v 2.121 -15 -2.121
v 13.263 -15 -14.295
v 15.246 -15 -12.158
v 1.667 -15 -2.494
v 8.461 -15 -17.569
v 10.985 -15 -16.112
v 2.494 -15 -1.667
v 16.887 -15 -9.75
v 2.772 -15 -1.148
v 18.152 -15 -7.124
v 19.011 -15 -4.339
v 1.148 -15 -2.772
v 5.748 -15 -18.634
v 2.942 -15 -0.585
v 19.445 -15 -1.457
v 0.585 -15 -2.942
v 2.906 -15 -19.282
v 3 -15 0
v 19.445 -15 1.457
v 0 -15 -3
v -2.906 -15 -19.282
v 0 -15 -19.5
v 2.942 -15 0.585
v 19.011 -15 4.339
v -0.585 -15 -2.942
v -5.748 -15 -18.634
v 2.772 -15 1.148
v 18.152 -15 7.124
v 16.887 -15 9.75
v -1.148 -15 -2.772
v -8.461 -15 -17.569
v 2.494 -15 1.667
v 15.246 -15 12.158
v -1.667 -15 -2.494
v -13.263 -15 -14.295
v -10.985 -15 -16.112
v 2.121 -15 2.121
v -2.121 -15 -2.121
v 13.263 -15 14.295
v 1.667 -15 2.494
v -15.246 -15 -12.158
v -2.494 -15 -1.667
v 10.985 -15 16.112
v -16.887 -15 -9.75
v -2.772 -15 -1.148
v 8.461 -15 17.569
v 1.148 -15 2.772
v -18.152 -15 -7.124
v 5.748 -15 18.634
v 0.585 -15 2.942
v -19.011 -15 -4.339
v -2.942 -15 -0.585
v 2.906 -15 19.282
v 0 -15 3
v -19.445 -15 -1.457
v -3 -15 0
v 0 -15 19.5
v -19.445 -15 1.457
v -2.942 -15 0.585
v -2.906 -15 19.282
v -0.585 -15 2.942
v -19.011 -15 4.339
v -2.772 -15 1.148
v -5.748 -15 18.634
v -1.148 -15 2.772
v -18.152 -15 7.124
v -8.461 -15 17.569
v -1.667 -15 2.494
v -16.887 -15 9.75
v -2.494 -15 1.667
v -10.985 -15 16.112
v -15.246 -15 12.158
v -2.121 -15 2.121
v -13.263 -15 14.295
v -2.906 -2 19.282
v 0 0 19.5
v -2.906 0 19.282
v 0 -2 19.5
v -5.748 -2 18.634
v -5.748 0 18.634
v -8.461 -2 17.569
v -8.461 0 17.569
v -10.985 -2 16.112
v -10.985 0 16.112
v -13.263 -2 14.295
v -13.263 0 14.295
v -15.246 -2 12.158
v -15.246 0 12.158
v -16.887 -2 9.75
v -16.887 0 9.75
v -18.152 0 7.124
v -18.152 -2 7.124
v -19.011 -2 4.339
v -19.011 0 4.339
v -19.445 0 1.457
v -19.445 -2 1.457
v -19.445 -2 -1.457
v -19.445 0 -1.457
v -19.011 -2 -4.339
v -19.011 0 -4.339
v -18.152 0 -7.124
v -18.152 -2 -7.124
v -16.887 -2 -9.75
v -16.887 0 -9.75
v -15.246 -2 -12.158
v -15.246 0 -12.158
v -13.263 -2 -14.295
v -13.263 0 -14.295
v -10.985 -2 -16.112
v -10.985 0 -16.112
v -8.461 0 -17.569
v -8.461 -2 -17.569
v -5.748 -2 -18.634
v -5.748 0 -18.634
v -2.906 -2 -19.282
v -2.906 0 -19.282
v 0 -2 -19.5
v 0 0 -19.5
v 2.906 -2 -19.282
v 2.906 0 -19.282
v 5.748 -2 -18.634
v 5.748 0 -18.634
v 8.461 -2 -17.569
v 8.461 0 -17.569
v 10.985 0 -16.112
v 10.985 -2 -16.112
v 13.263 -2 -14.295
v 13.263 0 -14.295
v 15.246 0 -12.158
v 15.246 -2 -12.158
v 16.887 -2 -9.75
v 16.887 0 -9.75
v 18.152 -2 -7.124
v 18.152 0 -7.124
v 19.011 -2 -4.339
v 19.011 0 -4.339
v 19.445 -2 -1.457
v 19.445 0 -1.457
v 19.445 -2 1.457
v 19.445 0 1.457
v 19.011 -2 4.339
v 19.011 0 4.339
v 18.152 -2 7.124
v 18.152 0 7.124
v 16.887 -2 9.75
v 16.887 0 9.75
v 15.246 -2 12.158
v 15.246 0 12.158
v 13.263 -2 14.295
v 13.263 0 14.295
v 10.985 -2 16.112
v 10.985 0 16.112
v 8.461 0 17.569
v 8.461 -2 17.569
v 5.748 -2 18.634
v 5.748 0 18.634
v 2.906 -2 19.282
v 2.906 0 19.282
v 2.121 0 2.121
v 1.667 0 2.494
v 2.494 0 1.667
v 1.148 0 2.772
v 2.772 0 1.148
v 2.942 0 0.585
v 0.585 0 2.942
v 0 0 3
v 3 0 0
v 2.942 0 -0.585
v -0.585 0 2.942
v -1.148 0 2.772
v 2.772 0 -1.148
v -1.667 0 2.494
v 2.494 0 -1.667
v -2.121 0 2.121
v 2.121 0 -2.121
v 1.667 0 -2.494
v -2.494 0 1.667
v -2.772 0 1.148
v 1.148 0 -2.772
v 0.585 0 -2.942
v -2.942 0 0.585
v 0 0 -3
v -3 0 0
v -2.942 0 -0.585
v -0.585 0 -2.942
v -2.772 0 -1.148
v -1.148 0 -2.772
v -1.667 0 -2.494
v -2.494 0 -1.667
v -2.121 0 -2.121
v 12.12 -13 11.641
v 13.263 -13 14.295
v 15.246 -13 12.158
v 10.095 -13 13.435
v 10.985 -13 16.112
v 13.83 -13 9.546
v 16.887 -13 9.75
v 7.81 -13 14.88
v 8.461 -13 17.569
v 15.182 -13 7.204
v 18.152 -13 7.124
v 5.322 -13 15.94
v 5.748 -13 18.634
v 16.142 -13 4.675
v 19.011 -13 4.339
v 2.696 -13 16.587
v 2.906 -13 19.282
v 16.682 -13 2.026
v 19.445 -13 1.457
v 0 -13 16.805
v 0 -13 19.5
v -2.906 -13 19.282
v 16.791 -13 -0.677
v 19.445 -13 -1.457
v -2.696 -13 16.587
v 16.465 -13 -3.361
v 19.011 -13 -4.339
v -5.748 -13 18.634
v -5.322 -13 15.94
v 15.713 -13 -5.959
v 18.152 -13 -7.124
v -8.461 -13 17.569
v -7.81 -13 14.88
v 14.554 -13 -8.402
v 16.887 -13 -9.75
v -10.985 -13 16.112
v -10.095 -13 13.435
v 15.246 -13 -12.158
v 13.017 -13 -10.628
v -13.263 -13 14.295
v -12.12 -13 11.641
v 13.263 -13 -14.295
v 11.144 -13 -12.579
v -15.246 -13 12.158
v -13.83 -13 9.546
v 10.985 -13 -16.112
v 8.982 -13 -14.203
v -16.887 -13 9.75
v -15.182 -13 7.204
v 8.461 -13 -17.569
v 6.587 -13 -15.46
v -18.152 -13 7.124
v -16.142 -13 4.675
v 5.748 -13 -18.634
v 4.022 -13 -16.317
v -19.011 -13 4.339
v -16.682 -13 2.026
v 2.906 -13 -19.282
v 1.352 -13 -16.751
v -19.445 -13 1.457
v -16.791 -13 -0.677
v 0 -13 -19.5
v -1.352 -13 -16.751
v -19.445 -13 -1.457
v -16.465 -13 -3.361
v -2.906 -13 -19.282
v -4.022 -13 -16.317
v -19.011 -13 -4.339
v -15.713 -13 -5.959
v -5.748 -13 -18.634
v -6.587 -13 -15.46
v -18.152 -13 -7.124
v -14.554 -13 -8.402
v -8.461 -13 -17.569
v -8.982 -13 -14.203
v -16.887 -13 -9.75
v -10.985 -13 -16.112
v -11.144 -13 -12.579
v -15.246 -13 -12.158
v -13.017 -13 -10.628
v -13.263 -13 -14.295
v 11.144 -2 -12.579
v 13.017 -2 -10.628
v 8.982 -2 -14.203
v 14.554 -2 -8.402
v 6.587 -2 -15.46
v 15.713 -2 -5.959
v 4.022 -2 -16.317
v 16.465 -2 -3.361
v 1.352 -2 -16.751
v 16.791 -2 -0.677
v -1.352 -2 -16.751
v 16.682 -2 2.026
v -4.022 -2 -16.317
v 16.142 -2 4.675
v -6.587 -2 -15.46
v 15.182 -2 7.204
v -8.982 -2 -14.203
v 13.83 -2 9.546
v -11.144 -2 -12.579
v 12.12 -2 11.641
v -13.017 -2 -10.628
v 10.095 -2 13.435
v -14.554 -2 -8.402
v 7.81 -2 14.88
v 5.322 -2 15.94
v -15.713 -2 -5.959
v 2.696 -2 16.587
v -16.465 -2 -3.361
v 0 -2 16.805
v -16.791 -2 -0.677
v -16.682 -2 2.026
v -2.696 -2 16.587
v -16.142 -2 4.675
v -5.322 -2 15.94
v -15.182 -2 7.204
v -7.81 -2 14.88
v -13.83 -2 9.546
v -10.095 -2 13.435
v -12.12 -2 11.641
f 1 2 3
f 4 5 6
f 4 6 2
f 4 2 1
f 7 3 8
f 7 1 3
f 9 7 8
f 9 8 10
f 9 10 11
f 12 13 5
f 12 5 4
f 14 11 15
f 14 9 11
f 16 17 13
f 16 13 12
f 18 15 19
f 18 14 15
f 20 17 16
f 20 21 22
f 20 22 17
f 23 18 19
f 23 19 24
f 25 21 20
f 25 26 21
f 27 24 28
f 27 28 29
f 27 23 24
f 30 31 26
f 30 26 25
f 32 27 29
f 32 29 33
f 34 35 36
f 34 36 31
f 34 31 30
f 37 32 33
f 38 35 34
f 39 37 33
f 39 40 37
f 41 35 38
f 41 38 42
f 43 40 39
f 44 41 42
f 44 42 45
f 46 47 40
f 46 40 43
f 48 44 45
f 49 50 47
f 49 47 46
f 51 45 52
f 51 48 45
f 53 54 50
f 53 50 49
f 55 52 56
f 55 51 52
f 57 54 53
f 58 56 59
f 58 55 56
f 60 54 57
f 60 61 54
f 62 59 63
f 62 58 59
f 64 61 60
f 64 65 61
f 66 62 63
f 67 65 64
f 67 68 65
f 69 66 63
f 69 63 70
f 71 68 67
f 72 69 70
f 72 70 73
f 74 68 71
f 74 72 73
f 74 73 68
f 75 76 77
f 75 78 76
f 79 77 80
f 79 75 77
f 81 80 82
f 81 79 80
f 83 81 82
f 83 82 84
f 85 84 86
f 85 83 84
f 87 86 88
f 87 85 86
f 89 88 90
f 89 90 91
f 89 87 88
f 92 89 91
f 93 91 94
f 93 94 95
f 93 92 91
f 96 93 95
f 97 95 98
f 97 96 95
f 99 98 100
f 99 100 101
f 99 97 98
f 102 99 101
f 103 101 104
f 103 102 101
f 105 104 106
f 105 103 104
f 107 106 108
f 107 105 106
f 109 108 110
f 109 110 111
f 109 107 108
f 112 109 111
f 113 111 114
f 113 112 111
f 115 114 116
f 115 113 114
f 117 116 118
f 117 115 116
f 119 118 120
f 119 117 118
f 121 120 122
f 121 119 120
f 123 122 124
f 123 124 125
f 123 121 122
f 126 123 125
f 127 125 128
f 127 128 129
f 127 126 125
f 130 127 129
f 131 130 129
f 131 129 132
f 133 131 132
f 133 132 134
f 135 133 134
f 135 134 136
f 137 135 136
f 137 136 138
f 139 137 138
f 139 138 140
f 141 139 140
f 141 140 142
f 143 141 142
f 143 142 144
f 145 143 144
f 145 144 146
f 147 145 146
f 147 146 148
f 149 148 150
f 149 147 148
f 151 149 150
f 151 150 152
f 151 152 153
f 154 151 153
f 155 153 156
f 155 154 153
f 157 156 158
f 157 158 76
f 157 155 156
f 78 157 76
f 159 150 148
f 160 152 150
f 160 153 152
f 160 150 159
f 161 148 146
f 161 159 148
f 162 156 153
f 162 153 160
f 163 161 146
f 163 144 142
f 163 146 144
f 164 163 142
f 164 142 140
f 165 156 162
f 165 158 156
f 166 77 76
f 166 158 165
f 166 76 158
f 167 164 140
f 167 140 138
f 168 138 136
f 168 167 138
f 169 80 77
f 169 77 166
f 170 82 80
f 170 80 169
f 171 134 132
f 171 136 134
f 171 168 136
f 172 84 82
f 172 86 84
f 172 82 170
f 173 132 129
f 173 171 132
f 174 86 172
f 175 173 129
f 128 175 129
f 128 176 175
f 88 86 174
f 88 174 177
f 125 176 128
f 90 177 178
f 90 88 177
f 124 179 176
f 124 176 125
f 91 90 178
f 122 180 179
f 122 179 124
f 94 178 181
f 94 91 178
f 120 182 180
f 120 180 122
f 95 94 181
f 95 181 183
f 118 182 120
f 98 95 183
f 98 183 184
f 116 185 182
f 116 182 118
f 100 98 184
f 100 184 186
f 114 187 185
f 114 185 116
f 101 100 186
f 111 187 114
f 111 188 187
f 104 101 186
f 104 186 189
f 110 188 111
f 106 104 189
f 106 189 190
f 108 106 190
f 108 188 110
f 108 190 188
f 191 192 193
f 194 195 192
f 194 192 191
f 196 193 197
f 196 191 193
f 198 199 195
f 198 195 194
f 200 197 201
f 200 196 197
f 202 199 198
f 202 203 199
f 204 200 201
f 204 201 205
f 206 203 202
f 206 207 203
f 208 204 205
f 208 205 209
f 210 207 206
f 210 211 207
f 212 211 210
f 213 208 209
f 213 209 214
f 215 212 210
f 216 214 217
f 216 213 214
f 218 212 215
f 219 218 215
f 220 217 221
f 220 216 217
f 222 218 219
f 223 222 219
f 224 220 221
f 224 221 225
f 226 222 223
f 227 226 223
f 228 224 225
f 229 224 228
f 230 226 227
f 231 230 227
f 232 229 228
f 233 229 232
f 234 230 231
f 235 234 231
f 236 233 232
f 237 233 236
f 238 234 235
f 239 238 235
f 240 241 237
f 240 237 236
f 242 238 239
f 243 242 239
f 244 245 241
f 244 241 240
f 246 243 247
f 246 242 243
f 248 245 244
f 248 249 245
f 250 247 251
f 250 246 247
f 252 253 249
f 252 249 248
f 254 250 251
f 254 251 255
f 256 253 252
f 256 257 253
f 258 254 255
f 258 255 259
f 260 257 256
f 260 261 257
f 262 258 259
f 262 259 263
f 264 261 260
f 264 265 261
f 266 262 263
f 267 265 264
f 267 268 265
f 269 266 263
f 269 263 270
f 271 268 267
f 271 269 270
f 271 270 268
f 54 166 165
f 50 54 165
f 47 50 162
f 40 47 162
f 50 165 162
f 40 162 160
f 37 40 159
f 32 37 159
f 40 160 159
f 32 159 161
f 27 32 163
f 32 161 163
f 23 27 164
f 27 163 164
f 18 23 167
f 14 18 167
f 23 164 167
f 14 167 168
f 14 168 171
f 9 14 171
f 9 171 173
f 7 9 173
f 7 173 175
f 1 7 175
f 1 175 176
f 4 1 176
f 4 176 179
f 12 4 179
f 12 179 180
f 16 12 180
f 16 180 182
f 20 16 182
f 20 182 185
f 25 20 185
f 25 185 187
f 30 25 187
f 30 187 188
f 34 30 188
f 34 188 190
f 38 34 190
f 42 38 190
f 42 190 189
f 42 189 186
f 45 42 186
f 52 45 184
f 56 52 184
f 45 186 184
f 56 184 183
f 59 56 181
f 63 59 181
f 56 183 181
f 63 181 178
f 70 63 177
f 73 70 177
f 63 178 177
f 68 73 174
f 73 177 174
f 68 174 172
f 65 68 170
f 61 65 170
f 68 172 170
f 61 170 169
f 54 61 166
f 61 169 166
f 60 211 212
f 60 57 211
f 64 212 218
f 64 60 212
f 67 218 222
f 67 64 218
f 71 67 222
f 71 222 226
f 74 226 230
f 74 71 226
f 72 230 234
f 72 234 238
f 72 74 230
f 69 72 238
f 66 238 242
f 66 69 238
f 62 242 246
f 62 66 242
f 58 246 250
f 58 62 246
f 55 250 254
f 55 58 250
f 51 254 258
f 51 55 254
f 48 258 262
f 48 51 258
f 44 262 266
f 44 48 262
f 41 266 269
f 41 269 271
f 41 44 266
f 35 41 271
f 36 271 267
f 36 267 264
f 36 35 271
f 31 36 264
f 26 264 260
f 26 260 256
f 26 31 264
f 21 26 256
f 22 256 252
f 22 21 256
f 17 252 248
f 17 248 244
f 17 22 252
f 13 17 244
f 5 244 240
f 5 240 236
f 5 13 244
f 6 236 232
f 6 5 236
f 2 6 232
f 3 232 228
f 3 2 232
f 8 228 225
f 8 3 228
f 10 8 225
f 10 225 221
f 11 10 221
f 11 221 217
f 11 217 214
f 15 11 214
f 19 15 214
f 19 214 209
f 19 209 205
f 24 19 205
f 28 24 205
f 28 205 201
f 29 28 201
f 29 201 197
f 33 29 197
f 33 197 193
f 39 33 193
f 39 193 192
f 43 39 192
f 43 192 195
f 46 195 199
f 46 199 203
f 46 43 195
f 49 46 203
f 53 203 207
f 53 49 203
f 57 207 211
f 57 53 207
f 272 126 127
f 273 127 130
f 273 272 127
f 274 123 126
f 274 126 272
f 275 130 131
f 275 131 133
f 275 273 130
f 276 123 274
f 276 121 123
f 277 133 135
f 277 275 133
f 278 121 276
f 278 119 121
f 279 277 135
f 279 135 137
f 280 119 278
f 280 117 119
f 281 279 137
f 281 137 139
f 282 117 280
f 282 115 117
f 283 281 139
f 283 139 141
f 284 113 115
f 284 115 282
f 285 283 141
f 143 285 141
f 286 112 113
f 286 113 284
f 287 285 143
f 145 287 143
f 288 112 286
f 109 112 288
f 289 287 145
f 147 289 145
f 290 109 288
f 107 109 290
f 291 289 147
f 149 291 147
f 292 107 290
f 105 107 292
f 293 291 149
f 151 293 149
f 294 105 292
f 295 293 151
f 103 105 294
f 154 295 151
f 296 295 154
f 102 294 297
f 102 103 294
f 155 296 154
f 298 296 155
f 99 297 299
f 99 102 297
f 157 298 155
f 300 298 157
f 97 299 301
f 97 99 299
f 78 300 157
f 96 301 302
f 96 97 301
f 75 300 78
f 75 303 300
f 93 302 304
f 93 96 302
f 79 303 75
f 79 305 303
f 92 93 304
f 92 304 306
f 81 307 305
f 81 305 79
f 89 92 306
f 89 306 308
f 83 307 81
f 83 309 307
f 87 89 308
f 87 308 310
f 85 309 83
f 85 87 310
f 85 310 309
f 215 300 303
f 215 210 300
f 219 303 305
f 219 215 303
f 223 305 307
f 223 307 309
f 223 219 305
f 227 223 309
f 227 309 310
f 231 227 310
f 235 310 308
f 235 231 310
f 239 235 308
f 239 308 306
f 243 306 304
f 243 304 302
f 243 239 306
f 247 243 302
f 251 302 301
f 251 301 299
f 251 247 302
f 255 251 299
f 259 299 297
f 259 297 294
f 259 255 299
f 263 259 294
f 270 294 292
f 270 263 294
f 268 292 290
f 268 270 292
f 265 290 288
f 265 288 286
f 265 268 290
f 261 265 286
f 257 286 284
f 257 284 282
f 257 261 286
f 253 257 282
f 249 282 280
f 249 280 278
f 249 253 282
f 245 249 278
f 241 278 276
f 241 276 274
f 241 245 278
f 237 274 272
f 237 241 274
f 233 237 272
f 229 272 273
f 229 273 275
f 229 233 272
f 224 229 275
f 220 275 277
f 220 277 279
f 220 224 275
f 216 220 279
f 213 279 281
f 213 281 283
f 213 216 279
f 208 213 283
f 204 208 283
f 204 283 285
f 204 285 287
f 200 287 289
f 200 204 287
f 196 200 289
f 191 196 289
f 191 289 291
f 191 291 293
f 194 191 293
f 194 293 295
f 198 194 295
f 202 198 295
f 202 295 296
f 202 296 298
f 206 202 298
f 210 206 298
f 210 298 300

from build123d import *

# Parameters (mm, degrees)
SKETCH_2_R          = 3
CUT_EXTRUDE_1_DEPTH = 32.392674305


with BuildPart() as part:
    # 草图1 → 旋转1 (revolve)
    with BuildSketch(Plane.XY, mode=Mode.PRIVATE) as revolve_1_sk:
        Polygon((0, 0), (19.5, 0), (19.5, -2), (16.805, -2), (16.805, -13), (19.5, -13), (19.5, -15), (0, -15), align=None)
    revolve(revolve_1_sk.sketch.rotate(Axis((0, 23.575757576, 0), (0, -1, 0)), 90), axis=Axis((0, 23.575757576, 0), (0, -1, 0)))

    # 草图2 → 切除-拉伸1 (cut, through all)
    with BuildSketch(Plane(origin=(0, 0, 0), x_dir=(1, 0, 0), z_dir=(0, 1, 0))):
        with Locations(Location((0, 0, 0), (0, 0, 270))):
            Circle(SKETCH_2_R)
    extrude(amount=-CUT_EXTRUDE_1_DEPTH, mode=Mode.SUBTRACT)


solid = part.part
